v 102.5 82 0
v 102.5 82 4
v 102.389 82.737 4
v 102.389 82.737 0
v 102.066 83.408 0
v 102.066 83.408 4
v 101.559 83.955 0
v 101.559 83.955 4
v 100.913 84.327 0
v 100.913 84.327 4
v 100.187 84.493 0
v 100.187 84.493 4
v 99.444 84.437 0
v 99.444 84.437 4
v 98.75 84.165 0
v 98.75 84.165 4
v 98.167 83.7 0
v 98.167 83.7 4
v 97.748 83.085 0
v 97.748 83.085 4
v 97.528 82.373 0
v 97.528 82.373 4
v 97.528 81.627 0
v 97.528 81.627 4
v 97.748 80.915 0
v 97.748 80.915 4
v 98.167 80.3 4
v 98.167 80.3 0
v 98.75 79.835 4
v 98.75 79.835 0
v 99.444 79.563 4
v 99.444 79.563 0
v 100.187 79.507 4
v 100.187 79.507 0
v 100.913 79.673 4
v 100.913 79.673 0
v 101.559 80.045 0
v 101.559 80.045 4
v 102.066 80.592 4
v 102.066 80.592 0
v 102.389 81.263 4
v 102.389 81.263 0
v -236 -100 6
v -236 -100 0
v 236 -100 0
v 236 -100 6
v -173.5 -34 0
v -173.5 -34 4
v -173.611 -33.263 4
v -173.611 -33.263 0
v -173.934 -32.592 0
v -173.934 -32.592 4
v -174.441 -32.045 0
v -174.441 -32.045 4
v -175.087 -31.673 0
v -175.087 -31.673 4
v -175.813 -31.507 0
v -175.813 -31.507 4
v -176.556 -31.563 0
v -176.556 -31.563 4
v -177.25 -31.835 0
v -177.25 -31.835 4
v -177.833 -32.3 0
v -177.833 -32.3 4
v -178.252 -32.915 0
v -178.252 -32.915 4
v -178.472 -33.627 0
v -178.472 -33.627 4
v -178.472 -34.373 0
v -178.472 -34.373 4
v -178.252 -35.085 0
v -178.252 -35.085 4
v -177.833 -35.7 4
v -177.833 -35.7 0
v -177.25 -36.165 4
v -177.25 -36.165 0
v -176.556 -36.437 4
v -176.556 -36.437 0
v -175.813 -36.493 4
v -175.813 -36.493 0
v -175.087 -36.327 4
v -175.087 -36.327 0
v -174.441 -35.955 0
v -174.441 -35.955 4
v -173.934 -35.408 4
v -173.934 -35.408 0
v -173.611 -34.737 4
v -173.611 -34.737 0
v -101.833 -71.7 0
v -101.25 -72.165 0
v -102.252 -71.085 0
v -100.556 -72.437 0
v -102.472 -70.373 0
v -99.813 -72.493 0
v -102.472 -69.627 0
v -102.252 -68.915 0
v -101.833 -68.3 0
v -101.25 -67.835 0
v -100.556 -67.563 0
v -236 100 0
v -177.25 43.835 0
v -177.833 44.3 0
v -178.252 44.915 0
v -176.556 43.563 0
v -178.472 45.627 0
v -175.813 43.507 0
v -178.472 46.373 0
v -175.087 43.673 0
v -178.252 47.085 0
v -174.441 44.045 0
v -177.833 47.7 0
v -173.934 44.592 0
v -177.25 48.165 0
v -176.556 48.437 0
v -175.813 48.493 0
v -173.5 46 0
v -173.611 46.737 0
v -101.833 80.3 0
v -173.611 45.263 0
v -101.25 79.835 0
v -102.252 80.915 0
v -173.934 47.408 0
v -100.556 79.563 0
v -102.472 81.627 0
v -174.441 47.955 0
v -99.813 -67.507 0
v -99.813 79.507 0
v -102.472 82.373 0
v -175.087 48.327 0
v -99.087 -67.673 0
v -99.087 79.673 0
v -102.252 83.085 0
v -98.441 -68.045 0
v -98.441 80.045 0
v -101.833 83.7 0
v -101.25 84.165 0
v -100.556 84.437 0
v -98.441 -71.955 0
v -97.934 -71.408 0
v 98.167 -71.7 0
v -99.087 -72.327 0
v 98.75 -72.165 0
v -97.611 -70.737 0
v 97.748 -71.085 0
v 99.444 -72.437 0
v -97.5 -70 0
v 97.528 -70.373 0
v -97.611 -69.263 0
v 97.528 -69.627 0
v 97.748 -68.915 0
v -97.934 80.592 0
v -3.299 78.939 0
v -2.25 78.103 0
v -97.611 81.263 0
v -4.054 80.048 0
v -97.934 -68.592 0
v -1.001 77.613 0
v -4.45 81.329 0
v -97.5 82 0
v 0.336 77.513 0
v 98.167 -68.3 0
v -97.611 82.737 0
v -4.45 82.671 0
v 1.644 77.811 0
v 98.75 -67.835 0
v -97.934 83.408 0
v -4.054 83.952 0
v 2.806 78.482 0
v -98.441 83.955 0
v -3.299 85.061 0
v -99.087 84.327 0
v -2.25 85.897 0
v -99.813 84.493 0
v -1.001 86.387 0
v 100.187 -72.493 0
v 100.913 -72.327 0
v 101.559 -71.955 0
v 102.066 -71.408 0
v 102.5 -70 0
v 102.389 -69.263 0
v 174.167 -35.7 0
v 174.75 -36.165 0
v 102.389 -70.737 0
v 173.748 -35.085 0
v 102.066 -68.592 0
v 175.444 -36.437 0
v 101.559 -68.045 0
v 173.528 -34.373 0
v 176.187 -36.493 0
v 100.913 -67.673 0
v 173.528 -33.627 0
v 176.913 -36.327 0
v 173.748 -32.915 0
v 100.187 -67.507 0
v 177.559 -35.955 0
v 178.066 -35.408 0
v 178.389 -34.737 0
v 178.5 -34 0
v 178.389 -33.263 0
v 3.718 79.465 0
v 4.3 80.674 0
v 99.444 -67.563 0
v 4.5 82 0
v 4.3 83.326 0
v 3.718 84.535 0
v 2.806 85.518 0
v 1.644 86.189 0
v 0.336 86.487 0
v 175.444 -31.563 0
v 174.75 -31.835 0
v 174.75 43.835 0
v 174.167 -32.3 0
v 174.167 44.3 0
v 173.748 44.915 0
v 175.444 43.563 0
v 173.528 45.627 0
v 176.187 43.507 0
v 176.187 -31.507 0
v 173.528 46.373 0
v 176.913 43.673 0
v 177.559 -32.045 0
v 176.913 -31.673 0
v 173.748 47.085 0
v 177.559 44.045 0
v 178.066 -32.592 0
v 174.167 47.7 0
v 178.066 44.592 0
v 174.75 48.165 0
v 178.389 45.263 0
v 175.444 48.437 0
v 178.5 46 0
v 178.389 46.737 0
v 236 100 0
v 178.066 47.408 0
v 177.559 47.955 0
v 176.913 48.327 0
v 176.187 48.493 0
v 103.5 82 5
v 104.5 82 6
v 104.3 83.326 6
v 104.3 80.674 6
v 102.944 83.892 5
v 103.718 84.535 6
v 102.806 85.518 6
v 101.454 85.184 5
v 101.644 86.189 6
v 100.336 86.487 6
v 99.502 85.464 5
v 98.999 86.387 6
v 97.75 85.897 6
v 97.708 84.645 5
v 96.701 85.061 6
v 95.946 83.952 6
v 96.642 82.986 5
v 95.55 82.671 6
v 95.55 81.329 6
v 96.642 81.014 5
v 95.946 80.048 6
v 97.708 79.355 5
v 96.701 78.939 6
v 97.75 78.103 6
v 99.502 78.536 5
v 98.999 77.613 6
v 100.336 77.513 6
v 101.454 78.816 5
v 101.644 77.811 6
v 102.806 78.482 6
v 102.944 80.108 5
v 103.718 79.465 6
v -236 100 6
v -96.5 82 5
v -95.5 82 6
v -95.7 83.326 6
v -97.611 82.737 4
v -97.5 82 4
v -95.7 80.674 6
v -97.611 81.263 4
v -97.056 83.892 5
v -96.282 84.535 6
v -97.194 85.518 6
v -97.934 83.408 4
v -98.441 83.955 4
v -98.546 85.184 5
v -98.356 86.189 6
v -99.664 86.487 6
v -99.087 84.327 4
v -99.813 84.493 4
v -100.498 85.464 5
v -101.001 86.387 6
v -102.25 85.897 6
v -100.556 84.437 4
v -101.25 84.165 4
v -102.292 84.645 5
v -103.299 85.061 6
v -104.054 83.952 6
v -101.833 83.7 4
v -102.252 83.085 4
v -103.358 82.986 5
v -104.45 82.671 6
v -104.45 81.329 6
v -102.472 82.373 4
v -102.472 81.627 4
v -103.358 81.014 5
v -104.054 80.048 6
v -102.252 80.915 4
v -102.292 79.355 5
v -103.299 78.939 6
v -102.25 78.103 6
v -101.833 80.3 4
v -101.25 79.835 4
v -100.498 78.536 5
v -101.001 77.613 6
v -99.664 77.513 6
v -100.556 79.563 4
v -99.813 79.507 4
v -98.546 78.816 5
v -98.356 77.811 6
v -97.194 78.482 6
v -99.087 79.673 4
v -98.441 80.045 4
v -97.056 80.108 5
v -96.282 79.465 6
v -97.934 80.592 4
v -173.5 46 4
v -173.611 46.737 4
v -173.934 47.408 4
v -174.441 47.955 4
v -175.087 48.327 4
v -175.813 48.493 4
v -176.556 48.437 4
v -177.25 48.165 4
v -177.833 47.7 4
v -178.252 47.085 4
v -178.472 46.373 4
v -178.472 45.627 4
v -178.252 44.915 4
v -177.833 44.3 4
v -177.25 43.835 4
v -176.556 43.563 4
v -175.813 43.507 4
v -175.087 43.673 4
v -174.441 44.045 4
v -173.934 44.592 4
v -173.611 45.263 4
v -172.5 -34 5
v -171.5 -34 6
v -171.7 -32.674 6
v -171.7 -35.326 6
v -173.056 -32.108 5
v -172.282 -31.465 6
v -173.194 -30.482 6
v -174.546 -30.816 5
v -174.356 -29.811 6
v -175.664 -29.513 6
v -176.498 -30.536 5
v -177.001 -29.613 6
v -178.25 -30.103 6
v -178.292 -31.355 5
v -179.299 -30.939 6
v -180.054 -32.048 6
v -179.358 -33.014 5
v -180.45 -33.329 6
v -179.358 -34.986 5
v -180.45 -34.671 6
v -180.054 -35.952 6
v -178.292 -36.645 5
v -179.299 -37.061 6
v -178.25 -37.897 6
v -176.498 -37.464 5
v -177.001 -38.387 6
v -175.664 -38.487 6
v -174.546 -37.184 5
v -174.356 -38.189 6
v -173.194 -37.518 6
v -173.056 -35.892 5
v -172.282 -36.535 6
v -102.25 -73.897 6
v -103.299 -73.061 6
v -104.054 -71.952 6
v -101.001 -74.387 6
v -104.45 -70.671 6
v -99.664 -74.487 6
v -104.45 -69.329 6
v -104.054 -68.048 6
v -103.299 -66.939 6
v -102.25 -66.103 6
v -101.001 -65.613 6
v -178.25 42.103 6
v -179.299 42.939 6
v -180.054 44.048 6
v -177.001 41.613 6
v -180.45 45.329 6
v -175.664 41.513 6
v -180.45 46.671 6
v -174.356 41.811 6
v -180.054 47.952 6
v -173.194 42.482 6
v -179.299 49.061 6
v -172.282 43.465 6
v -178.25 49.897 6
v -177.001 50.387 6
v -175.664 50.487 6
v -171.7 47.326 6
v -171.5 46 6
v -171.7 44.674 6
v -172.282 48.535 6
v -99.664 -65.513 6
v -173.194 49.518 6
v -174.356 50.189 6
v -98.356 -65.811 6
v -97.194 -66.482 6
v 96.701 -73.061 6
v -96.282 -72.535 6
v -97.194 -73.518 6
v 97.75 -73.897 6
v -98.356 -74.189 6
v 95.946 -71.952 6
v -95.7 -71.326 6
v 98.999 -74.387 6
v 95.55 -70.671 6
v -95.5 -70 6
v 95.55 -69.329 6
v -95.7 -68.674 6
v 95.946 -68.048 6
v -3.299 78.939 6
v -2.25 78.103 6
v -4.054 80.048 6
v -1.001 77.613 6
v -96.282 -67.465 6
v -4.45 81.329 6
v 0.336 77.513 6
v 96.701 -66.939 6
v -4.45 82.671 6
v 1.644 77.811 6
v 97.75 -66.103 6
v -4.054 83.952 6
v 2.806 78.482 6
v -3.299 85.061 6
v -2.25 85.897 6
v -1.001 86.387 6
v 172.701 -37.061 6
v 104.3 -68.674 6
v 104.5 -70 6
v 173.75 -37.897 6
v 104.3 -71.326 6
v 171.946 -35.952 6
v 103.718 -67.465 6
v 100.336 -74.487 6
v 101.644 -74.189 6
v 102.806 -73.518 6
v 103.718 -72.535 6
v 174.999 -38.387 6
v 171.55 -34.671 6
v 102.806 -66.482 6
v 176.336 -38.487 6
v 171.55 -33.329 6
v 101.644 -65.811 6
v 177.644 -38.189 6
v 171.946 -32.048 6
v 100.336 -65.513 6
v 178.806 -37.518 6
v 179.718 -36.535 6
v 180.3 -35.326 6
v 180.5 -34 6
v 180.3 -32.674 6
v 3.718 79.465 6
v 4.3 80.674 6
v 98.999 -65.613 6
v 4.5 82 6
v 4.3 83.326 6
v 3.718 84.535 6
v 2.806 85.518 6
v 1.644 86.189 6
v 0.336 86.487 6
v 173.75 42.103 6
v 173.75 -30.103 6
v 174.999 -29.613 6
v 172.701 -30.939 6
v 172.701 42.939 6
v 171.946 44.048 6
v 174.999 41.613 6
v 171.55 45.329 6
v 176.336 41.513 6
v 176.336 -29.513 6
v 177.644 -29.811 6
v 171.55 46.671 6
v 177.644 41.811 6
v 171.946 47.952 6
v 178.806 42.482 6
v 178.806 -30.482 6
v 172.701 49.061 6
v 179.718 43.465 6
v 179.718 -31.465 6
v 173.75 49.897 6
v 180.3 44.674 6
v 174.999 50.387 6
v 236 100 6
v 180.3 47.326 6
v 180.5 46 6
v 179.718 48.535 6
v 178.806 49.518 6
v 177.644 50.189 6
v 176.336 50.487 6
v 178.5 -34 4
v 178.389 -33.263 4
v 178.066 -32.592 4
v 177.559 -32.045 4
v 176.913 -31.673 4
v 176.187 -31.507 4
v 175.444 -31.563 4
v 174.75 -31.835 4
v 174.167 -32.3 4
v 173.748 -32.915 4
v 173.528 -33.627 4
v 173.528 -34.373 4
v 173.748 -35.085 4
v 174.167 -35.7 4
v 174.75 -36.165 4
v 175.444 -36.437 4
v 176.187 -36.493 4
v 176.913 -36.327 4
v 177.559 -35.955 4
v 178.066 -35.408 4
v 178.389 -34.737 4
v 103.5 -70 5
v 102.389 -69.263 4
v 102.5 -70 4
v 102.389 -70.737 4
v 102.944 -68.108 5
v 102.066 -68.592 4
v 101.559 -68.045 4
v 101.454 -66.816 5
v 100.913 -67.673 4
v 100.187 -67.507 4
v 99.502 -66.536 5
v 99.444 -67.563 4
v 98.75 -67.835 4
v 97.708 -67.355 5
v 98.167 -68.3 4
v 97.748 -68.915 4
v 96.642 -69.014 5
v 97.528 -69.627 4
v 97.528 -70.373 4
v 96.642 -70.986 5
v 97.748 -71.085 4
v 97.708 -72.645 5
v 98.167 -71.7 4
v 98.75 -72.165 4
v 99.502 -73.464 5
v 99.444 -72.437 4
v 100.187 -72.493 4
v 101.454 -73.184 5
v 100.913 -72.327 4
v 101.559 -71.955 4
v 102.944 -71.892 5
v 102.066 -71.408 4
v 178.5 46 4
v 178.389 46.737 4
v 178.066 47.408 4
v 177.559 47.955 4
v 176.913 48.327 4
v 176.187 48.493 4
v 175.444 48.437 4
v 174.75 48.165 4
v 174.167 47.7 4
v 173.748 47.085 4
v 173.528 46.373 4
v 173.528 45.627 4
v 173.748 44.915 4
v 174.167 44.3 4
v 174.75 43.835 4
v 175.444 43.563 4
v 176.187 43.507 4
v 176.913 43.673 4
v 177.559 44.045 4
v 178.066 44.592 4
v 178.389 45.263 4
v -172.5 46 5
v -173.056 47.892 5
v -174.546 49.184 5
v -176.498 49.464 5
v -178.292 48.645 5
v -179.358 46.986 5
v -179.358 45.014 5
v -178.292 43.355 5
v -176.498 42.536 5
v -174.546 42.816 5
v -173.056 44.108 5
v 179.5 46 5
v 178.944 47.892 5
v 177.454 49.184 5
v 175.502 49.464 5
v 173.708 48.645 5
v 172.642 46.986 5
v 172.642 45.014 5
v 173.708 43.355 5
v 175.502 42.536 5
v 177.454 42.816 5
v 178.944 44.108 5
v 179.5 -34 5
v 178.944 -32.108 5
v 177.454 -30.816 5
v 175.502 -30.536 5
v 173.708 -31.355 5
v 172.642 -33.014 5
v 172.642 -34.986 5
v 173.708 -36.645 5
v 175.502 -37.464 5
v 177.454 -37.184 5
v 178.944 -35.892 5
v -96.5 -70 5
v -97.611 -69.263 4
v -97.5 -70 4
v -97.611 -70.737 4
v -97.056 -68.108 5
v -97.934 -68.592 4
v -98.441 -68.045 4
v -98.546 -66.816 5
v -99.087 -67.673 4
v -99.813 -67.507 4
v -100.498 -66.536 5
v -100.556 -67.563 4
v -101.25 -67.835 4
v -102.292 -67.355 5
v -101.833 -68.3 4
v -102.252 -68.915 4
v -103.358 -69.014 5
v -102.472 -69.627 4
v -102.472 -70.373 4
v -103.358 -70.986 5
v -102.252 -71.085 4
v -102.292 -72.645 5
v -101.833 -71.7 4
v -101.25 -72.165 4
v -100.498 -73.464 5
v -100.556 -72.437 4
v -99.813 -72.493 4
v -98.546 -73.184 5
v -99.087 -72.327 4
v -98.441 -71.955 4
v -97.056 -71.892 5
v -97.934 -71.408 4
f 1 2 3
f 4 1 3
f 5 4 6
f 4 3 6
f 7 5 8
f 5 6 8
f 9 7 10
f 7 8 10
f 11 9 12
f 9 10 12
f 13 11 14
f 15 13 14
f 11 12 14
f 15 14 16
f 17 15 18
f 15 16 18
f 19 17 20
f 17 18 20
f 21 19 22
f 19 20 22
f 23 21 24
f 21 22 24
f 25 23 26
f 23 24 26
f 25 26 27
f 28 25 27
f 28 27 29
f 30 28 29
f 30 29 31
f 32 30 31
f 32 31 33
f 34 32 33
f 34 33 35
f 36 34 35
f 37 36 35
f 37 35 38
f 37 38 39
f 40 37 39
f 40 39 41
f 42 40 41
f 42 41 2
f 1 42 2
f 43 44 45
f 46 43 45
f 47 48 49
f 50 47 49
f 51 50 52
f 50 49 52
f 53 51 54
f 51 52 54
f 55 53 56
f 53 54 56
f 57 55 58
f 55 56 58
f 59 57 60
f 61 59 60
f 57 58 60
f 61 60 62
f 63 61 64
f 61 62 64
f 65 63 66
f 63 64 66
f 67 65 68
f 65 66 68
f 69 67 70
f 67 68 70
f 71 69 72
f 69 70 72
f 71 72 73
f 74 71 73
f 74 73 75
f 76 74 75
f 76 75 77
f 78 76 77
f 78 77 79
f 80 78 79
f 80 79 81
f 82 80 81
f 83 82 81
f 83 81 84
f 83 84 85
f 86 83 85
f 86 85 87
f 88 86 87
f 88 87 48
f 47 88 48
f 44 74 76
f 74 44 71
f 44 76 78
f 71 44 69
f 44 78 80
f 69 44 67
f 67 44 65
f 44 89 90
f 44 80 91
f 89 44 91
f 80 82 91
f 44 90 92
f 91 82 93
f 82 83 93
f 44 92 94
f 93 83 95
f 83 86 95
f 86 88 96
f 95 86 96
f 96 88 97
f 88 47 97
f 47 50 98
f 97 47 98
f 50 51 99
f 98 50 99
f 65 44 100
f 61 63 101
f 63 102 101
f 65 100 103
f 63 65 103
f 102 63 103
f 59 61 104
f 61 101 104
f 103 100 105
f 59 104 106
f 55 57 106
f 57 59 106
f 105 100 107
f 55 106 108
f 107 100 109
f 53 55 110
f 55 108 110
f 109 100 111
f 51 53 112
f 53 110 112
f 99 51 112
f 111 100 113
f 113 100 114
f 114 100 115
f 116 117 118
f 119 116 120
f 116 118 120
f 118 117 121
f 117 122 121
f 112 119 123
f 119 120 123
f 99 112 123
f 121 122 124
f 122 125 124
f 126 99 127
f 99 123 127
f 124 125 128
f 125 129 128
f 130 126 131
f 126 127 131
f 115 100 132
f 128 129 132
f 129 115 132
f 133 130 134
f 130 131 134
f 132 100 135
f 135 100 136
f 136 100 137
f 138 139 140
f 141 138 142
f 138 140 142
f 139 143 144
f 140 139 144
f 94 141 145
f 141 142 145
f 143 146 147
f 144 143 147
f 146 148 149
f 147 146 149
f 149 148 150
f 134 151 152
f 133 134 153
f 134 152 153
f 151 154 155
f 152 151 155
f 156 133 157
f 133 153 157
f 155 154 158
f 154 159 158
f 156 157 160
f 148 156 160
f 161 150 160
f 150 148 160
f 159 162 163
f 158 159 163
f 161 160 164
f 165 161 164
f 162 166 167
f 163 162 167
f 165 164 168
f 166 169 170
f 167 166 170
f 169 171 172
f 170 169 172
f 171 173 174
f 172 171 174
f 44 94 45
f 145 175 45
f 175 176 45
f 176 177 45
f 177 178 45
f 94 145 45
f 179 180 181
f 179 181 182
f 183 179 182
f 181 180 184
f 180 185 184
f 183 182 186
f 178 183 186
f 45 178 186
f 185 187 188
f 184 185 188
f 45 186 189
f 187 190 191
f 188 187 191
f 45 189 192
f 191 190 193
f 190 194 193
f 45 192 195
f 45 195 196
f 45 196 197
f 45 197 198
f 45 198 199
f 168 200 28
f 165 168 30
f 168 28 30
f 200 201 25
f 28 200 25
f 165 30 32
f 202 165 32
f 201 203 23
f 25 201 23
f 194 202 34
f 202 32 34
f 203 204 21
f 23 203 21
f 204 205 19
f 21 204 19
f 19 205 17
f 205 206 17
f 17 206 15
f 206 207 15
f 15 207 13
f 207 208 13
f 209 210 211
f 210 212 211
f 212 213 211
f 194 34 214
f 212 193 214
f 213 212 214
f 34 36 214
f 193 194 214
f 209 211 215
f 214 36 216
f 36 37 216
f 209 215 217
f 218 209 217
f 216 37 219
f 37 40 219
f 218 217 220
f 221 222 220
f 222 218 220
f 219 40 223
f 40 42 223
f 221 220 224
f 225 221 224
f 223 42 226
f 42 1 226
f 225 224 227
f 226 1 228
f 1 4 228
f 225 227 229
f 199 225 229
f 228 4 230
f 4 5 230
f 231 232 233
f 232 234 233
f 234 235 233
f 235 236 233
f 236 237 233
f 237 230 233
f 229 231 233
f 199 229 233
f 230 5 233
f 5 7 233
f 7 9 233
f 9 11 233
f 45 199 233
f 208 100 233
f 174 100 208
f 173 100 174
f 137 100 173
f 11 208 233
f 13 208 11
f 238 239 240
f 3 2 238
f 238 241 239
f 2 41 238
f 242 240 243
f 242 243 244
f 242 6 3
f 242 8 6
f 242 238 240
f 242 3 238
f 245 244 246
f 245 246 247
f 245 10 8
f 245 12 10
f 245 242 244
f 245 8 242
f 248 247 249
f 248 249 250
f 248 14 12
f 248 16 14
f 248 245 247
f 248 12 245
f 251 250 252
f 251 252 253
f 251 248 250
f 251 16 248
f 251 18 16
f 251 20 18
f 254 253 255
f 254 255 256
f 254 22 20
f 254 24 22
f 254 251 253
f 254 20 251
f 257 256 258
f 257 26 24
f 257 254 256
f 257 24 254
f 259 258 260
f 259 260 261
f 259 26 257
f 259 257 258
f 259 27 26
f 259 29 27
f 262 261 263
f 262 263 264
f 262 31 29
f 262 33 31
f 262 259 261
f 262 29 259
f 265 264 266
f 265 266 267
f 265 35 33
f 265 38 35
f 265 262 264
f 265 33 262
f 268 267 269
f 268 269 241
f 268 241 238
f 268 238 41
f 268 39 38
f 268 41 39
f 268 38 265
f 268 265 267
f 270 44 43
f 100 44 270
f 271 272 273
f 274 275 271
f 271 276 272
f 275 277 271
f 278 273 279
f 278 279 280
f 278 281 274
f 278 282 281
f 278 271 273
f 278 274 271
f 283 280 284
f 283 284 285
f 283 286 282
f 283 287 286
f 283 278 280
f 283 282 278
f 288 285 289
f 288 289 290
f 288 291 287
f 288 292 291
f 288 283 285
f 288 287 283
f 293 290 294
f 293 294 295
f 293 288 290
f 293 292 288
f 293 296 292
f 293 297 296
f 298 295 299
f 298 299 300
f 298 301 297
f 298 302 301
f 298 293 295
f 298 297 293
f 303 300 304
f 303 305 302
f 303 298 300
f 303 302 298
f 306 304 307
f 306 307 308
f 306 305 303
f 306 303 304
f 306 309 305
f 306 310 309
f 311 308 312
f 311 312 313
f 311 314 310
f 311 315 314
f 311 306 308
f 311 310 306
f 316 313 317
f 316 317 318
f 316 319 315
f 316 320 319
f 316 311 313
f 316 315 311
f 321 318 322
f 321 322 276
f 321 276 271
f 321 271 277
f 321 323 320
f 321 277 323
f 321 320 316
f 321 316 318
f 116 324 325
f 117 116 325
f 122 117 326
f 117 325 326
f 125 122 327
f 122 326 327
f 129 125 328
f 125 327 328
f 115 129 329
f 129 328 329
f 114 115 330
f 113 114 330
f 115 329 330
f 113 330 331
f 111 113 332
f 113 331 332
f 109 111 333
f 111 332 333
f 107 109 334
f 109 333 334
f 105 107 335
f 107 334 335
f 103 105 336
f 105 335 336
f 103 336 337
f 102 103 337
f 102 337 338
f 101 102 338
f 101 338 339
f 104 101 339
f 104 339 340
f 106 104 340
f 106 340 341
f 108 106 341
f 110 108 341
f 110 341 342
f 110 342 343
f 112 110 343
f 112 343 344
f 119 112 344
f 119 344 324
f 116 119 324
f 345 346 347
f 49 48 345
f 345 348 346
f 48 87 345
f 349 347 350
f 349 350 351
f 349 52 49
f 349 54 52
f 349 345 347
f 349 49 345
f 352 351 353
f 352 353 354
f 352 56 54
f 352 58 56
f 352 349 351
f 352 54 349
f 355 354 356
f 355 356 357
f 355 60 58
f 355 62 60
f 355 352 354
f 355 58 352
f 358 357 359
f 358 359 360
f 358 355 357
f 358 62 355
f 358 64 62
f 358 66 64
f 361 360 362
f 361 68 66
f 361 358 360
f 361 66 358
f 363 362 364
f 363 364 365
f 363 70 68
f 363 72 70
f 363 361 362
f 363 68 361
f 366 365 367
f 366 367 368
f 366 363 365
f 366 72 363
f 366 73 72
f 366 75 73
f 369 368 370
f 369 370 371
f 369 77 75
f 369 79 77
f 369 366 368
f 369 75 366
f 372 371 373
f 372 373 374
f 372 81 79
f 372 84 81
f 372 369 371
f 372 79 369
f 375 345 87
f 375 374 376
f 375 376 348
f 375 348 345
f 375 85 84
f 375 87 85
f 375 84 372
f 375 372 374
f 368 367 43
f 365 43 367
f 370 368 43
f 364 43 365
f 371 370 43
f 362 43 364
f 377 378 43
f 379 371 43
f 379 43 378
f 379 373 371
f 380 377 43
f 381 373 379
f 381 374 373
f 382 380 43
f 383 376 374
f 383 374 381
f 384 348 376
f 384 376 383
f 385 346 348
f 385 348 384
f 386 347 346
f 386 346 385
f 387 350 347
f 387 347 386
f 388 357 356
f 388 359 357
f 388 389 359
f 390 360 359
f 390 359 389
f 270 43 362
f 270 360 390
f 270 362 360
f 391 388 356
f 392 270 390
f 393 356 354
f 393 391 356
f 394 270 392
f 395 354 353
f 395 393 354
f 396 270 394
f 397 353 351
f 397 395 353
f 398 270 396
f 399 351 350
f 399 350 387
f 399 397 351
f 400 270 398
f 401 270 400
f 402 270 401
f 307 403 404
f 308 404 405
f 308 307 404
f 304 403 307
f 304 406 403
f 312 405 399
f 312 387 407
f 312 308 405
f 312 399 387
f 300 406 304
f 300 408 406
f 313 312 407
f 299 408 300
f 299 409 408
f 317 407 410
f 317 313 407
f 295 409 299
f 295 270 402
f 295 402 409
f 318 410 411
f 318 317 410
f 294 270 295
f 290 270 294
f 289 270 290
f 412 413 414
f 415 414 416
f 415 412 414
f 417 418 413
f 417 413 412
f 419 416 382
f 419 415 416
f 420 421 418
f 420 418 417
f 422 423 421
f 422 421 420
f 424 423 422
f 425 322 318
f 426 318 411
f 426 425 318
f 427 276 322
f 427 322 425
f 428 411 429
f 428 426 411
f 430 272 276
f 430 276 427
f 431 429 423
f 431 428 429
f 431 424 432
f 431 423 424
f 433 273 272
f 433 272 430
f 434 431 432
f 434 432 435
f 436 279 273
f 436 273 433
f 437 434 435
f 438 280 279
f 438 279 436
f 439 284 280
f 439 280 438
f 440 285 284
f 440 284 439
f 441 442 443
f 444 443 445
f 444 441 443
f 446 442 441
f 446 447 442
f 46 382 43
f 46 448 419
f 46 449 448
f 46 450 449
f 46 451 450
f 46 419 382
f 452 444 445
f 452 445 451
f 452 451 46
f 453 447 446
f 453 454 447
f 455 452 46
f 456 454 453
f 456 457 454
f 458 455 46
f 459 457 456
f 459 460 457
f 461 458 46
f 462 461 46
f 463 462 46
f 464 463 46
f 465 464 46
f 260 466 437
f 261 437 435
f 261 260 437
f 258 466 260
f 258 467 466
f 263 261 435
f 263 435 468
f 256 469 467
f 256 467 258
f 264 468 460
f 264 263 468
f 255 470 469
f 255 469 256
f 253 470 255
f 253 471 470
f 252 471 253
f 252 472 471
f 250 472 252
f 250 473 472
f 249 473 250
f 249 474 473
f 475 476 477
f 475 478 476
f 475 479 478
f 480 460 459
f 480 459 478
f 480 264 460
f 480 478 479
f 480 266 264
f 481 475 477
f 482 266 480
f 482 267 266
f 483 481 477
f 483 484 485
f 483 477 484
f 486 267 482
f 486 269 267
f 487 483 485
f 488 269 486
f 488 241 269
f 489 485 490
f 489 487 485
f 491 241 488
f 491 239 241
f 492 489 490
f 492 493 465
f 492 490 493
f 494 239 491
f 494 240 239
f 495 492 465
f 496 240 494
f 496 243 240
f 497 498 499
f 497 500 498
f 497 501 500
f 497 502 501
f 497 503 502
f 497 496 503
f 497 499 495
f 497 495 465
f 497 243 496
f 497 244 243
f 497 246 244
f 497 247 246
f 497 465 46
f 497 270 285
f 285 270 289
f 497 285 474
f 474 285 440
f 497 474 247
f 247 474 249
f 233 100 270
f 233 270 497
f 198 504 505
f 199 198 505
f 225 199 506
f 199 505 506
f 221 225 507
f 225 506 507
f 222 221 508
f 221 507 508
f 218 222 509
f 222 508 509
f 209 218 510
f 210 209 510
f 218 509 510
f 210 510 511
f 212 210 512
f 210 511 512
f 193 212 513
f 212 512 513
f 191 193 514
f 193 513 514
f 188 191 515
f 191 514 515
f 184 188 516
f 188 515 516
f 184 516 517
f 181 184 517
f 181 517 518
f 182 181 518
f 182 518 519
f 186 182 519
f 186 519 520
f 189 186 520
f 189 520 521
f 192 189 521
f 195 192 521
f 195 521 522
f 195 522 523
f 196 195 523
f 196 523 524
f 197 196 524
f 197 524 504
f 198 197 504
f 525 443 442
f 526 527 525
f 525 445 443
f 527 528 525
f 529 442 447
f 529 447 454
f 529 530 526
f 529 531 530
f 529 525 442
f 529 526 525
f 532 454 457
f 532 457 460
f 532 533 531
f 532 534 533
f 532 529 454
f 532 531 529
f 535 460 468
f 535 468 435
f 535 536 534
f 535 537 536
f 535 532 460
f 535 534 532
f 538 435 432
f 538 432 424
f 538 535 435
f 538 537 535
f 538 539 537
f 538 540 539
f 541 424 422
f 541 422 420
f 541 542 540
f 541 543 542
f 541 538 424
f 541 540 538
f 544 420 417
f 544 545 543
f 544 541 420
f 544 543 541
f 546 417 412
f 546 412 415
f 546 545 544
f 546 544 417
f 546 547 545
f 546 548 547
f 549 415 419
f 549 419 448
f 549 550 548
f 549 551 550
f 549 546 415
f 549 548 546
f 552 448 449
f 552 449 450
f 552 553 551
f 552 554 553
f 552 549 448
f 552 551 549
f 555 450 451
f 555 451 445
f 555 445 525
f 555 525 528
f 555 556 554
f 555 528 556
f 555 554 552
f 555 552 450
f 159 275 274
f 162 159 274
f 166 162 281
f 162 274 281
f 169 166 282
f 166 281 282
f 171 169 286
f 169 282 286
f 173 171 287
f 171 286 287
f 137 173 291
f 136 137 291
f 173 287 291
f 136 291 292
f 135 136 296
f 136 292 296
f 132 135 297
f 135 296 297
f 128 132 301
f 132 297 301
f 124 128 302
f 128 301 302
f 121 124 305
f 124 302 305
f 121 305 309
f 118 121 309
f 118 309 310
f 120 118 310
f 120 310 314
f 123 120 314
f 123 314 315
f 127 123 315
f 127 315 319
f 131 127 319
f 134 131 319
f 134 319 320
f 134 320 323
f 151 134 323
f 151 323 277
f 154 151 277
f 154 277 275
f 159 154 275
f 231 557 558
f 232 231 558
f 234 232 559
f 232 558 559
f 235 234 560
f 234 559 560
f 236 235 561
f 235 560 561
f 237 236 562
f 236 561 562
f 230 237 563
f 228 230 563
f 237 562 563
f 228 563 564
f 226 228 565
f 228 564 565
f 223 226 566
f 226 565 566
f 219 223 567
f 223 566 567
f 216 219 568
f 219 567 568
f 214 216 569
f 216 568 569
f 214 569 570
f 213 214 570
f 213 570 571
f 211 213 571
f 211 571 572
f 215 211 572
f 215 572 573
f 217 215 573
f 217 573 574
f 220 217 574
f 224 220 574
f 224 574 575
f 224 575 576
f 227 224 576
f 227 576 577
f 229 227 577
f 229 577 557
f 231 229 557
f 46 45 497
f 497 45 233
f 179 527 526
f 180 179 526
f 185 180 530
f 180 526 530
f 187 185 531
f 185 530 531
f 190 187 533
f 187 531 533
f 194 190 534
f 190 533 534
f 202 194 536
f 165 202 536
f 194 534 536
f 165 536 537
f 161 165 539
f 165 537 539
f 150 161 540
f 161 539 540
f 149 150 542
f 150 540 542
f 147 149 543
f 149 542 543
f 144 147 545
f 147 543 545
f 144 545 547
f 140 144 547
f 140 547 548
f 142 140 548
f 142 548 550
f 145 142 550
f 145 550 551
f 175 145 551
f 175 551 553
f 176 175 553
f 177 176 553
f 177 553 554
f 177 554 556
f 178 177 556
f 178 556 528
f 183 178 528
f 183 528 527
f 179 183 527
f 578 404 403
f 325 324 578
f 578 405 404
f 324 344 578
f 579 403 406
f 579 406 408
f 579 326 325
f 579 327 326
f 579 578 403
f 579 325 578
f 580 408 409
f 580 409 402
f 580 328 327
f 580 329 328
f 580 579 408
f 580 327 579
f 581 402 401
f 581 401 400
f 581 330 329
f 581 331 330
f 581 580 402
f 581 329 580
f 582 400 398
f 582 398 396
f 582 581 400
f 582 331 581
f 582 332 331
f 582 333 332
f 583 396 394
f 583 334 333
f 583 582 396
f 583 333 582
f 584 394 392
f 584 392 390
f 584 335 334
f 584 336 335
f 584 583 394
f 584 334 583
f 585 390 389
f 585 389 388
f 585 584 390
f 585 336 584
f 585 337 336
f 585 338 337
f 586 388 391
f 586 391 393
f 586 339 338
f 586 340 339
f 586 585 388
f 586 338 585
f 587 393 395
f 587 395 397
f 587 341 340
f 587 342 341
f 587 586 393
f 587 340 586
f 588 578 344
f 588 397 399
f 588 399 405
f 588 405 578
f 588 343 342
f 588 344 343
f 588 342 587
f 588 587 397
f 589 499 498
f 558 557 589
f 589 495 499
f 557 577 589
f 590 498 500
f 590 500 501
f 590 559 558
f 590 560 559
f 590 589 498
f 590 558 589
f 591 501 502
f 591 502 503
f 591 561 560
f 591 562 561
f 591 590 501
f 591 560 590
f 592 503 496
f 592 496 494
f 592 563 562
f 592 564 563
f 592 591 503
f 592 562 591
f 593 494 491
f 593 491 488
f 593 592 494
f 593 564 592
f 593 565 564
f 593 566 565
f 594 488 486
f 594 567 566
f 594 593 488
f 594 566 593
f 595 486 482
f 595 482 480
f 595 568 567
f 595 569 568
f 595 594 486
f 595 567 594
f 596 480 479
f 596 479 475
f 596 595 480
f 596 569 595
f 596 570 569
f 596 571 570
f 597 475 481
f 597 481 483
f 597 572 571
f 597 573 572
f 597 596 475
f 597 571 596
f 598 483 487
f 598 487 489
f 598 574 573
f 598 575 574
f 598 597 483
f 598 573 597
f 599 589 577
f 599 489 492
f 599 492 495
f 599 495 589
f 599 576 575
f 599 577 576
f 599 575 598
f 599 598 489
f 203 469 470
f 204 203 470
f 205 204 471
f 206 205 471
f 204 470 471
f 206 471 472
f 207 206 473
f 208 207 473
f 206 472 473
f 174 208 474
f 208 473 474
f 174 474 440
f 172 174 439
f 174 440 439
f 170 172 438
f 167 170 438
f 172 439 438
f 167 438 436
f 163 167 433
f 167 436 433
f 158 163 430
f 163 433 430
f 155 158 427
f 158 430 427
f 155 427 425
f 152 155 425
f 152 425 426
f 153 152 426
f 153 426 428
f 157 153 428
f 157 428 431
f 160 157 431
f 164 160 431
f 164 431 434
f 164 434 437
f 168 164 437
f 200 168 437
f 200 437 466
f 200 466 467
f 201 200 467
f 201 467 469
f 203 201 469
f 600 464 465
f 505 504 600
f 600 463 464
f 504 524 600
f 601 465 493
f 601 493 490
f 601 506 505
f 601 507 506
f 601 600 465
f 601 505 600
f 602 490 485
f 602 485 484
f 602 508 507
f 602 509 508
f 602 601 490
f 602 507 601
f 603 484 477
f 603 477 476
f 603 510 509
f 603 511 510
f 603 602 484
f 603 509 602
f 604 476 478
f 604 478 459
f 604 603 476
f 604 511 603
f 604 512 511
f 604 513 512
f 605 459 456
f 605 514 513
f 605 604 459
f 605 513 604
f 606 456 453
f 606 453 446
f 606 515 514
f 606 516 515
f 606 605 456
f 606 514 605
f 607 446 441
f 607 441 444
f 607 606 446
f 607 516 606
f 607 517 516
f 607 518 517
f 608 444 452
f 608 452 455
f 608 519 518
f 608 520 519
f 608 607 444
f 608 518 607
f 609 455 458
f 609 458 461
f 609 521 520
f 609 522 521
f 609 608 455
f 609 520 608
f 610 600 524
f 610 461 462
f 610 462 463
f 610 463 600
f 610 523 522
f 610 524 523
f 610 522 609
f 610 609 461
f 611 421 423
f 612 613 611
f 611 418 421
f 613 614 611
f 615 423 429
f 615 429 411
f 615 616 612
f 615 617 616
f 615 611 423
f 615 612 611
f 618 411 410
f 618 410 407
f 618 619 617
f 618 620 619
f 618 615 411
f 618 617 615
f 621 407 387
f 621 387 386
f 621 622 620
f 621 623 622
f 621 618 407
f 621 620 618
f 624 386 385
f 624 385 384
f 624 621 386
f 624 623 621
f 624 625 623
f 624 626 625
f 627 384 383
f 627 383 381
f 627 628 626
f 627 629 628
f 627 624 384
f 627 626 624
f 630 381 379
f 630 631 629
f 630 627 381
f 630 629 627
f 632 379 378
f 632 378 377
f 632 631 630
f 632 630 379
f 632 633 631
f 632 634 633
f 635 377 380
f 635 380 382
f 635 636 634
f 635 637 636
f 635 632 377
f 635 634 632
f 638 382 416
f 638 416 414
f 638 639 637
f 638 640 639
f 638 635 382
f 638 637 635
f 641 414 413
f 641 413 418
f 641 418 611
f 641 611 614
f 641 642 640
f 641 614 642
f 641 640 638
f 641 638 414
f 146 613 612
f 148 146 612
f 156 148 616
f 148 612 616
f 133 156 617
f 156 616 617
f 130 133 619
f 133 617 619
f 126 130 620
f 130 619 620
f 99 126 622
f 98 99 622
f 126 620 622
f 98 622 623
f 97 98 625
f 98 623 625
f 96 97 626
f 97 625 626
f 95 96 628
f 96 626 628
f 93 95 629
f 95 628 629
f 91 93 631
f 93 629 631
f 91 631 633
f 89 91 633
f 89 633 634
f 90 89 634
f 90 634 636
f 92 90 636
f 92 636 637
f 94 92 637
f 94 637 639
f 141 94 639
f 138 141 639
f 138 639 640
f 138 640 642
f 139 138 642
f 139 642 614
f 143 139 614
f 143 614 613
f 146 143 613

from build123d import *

# Parameters (mm, degrees)
ESQUISSE1_W             = 472
ESQUISSE1_H             = 200
BOSS_EXTRU_1_DEPTH      = 6
ESQUISSE2_R             = 2.5
ENL_V_MAT_EXTRU_1_DEPTH = 257.382526706
CHANFREIN1_SIZE         = 2
ESQUISSE4_R             = 4.5
ENL_V_MAT_EXTRU_2_DEPTH = 257.382526706


with BuildPart() as part:
    # Esquisse1 → Boss.-Extru.1 (new body)
    with BuildSketch(Plane.XY):
        Rectangle(ESQUISSE1_W, ESQUISSE1_H)
    extrude(amount=BOSS_EXTRU_1_DEPTH)

    # Esquisse2 → Enlèv. mat.-Extru.1 (cut, through all)
    with BuildSketch(Plane.XY.offset(6)):
        with Locations((100, -70)):
            Circle(ESQUISSE2_R)
        with Locations((-100, -70)):
            Circle(ESQUISSE2_R)
        with Locations((-100, 82)):
            Circle(ESQUISSE2_R)
        with Locations((100, 82)):
            Circle(ESQUISSE2_R)
        with Locations((176, -34)):
            Circle(ESQUISSE2_R)
        with Locations((176, 46)):
            Circle(ESQUISSE2_R)
        with Locations((-176, 46)):
            Circle(ESQUISSE2_R)
        with Locations((-176, -34)):
            Circle(ESQUISSE2_R)
    extrude(amount=-ENL_V_MAT_EXTRU_1_DEPTH, mode=Mode.SUBTRACT)

    # Chanfrein1
    chanfrein1_edges = [part.edges().sort_by_distance(p)[0] for p in [
        (-102.5, -70, 6),
        (-102.5, 82, 6),
        (97.5, 82, 6),
        (173.5, 46, 6),
        (-178.5, -34, 6),
        (-178.5, 46, 6),
        (173.5, -34, 6),
        (97.5, -70, 6),
    ]]
    chamfer(chanfrein1_edges, length=CHANFREIN1_SIZE)

    # Esquisse4 → Enlèv. mat.-Extru.2 (cut, through all)
    with BuildSketch(Plane.XY.offset(6)):
        with Locations((0, 82)):
            Circle(ESQUISSE4_R)
    extrude(amount=-ENL_V_MAT_EXTRU_2_DEPTH, mode=Mode.SUBTRACT)


solid = part.part
